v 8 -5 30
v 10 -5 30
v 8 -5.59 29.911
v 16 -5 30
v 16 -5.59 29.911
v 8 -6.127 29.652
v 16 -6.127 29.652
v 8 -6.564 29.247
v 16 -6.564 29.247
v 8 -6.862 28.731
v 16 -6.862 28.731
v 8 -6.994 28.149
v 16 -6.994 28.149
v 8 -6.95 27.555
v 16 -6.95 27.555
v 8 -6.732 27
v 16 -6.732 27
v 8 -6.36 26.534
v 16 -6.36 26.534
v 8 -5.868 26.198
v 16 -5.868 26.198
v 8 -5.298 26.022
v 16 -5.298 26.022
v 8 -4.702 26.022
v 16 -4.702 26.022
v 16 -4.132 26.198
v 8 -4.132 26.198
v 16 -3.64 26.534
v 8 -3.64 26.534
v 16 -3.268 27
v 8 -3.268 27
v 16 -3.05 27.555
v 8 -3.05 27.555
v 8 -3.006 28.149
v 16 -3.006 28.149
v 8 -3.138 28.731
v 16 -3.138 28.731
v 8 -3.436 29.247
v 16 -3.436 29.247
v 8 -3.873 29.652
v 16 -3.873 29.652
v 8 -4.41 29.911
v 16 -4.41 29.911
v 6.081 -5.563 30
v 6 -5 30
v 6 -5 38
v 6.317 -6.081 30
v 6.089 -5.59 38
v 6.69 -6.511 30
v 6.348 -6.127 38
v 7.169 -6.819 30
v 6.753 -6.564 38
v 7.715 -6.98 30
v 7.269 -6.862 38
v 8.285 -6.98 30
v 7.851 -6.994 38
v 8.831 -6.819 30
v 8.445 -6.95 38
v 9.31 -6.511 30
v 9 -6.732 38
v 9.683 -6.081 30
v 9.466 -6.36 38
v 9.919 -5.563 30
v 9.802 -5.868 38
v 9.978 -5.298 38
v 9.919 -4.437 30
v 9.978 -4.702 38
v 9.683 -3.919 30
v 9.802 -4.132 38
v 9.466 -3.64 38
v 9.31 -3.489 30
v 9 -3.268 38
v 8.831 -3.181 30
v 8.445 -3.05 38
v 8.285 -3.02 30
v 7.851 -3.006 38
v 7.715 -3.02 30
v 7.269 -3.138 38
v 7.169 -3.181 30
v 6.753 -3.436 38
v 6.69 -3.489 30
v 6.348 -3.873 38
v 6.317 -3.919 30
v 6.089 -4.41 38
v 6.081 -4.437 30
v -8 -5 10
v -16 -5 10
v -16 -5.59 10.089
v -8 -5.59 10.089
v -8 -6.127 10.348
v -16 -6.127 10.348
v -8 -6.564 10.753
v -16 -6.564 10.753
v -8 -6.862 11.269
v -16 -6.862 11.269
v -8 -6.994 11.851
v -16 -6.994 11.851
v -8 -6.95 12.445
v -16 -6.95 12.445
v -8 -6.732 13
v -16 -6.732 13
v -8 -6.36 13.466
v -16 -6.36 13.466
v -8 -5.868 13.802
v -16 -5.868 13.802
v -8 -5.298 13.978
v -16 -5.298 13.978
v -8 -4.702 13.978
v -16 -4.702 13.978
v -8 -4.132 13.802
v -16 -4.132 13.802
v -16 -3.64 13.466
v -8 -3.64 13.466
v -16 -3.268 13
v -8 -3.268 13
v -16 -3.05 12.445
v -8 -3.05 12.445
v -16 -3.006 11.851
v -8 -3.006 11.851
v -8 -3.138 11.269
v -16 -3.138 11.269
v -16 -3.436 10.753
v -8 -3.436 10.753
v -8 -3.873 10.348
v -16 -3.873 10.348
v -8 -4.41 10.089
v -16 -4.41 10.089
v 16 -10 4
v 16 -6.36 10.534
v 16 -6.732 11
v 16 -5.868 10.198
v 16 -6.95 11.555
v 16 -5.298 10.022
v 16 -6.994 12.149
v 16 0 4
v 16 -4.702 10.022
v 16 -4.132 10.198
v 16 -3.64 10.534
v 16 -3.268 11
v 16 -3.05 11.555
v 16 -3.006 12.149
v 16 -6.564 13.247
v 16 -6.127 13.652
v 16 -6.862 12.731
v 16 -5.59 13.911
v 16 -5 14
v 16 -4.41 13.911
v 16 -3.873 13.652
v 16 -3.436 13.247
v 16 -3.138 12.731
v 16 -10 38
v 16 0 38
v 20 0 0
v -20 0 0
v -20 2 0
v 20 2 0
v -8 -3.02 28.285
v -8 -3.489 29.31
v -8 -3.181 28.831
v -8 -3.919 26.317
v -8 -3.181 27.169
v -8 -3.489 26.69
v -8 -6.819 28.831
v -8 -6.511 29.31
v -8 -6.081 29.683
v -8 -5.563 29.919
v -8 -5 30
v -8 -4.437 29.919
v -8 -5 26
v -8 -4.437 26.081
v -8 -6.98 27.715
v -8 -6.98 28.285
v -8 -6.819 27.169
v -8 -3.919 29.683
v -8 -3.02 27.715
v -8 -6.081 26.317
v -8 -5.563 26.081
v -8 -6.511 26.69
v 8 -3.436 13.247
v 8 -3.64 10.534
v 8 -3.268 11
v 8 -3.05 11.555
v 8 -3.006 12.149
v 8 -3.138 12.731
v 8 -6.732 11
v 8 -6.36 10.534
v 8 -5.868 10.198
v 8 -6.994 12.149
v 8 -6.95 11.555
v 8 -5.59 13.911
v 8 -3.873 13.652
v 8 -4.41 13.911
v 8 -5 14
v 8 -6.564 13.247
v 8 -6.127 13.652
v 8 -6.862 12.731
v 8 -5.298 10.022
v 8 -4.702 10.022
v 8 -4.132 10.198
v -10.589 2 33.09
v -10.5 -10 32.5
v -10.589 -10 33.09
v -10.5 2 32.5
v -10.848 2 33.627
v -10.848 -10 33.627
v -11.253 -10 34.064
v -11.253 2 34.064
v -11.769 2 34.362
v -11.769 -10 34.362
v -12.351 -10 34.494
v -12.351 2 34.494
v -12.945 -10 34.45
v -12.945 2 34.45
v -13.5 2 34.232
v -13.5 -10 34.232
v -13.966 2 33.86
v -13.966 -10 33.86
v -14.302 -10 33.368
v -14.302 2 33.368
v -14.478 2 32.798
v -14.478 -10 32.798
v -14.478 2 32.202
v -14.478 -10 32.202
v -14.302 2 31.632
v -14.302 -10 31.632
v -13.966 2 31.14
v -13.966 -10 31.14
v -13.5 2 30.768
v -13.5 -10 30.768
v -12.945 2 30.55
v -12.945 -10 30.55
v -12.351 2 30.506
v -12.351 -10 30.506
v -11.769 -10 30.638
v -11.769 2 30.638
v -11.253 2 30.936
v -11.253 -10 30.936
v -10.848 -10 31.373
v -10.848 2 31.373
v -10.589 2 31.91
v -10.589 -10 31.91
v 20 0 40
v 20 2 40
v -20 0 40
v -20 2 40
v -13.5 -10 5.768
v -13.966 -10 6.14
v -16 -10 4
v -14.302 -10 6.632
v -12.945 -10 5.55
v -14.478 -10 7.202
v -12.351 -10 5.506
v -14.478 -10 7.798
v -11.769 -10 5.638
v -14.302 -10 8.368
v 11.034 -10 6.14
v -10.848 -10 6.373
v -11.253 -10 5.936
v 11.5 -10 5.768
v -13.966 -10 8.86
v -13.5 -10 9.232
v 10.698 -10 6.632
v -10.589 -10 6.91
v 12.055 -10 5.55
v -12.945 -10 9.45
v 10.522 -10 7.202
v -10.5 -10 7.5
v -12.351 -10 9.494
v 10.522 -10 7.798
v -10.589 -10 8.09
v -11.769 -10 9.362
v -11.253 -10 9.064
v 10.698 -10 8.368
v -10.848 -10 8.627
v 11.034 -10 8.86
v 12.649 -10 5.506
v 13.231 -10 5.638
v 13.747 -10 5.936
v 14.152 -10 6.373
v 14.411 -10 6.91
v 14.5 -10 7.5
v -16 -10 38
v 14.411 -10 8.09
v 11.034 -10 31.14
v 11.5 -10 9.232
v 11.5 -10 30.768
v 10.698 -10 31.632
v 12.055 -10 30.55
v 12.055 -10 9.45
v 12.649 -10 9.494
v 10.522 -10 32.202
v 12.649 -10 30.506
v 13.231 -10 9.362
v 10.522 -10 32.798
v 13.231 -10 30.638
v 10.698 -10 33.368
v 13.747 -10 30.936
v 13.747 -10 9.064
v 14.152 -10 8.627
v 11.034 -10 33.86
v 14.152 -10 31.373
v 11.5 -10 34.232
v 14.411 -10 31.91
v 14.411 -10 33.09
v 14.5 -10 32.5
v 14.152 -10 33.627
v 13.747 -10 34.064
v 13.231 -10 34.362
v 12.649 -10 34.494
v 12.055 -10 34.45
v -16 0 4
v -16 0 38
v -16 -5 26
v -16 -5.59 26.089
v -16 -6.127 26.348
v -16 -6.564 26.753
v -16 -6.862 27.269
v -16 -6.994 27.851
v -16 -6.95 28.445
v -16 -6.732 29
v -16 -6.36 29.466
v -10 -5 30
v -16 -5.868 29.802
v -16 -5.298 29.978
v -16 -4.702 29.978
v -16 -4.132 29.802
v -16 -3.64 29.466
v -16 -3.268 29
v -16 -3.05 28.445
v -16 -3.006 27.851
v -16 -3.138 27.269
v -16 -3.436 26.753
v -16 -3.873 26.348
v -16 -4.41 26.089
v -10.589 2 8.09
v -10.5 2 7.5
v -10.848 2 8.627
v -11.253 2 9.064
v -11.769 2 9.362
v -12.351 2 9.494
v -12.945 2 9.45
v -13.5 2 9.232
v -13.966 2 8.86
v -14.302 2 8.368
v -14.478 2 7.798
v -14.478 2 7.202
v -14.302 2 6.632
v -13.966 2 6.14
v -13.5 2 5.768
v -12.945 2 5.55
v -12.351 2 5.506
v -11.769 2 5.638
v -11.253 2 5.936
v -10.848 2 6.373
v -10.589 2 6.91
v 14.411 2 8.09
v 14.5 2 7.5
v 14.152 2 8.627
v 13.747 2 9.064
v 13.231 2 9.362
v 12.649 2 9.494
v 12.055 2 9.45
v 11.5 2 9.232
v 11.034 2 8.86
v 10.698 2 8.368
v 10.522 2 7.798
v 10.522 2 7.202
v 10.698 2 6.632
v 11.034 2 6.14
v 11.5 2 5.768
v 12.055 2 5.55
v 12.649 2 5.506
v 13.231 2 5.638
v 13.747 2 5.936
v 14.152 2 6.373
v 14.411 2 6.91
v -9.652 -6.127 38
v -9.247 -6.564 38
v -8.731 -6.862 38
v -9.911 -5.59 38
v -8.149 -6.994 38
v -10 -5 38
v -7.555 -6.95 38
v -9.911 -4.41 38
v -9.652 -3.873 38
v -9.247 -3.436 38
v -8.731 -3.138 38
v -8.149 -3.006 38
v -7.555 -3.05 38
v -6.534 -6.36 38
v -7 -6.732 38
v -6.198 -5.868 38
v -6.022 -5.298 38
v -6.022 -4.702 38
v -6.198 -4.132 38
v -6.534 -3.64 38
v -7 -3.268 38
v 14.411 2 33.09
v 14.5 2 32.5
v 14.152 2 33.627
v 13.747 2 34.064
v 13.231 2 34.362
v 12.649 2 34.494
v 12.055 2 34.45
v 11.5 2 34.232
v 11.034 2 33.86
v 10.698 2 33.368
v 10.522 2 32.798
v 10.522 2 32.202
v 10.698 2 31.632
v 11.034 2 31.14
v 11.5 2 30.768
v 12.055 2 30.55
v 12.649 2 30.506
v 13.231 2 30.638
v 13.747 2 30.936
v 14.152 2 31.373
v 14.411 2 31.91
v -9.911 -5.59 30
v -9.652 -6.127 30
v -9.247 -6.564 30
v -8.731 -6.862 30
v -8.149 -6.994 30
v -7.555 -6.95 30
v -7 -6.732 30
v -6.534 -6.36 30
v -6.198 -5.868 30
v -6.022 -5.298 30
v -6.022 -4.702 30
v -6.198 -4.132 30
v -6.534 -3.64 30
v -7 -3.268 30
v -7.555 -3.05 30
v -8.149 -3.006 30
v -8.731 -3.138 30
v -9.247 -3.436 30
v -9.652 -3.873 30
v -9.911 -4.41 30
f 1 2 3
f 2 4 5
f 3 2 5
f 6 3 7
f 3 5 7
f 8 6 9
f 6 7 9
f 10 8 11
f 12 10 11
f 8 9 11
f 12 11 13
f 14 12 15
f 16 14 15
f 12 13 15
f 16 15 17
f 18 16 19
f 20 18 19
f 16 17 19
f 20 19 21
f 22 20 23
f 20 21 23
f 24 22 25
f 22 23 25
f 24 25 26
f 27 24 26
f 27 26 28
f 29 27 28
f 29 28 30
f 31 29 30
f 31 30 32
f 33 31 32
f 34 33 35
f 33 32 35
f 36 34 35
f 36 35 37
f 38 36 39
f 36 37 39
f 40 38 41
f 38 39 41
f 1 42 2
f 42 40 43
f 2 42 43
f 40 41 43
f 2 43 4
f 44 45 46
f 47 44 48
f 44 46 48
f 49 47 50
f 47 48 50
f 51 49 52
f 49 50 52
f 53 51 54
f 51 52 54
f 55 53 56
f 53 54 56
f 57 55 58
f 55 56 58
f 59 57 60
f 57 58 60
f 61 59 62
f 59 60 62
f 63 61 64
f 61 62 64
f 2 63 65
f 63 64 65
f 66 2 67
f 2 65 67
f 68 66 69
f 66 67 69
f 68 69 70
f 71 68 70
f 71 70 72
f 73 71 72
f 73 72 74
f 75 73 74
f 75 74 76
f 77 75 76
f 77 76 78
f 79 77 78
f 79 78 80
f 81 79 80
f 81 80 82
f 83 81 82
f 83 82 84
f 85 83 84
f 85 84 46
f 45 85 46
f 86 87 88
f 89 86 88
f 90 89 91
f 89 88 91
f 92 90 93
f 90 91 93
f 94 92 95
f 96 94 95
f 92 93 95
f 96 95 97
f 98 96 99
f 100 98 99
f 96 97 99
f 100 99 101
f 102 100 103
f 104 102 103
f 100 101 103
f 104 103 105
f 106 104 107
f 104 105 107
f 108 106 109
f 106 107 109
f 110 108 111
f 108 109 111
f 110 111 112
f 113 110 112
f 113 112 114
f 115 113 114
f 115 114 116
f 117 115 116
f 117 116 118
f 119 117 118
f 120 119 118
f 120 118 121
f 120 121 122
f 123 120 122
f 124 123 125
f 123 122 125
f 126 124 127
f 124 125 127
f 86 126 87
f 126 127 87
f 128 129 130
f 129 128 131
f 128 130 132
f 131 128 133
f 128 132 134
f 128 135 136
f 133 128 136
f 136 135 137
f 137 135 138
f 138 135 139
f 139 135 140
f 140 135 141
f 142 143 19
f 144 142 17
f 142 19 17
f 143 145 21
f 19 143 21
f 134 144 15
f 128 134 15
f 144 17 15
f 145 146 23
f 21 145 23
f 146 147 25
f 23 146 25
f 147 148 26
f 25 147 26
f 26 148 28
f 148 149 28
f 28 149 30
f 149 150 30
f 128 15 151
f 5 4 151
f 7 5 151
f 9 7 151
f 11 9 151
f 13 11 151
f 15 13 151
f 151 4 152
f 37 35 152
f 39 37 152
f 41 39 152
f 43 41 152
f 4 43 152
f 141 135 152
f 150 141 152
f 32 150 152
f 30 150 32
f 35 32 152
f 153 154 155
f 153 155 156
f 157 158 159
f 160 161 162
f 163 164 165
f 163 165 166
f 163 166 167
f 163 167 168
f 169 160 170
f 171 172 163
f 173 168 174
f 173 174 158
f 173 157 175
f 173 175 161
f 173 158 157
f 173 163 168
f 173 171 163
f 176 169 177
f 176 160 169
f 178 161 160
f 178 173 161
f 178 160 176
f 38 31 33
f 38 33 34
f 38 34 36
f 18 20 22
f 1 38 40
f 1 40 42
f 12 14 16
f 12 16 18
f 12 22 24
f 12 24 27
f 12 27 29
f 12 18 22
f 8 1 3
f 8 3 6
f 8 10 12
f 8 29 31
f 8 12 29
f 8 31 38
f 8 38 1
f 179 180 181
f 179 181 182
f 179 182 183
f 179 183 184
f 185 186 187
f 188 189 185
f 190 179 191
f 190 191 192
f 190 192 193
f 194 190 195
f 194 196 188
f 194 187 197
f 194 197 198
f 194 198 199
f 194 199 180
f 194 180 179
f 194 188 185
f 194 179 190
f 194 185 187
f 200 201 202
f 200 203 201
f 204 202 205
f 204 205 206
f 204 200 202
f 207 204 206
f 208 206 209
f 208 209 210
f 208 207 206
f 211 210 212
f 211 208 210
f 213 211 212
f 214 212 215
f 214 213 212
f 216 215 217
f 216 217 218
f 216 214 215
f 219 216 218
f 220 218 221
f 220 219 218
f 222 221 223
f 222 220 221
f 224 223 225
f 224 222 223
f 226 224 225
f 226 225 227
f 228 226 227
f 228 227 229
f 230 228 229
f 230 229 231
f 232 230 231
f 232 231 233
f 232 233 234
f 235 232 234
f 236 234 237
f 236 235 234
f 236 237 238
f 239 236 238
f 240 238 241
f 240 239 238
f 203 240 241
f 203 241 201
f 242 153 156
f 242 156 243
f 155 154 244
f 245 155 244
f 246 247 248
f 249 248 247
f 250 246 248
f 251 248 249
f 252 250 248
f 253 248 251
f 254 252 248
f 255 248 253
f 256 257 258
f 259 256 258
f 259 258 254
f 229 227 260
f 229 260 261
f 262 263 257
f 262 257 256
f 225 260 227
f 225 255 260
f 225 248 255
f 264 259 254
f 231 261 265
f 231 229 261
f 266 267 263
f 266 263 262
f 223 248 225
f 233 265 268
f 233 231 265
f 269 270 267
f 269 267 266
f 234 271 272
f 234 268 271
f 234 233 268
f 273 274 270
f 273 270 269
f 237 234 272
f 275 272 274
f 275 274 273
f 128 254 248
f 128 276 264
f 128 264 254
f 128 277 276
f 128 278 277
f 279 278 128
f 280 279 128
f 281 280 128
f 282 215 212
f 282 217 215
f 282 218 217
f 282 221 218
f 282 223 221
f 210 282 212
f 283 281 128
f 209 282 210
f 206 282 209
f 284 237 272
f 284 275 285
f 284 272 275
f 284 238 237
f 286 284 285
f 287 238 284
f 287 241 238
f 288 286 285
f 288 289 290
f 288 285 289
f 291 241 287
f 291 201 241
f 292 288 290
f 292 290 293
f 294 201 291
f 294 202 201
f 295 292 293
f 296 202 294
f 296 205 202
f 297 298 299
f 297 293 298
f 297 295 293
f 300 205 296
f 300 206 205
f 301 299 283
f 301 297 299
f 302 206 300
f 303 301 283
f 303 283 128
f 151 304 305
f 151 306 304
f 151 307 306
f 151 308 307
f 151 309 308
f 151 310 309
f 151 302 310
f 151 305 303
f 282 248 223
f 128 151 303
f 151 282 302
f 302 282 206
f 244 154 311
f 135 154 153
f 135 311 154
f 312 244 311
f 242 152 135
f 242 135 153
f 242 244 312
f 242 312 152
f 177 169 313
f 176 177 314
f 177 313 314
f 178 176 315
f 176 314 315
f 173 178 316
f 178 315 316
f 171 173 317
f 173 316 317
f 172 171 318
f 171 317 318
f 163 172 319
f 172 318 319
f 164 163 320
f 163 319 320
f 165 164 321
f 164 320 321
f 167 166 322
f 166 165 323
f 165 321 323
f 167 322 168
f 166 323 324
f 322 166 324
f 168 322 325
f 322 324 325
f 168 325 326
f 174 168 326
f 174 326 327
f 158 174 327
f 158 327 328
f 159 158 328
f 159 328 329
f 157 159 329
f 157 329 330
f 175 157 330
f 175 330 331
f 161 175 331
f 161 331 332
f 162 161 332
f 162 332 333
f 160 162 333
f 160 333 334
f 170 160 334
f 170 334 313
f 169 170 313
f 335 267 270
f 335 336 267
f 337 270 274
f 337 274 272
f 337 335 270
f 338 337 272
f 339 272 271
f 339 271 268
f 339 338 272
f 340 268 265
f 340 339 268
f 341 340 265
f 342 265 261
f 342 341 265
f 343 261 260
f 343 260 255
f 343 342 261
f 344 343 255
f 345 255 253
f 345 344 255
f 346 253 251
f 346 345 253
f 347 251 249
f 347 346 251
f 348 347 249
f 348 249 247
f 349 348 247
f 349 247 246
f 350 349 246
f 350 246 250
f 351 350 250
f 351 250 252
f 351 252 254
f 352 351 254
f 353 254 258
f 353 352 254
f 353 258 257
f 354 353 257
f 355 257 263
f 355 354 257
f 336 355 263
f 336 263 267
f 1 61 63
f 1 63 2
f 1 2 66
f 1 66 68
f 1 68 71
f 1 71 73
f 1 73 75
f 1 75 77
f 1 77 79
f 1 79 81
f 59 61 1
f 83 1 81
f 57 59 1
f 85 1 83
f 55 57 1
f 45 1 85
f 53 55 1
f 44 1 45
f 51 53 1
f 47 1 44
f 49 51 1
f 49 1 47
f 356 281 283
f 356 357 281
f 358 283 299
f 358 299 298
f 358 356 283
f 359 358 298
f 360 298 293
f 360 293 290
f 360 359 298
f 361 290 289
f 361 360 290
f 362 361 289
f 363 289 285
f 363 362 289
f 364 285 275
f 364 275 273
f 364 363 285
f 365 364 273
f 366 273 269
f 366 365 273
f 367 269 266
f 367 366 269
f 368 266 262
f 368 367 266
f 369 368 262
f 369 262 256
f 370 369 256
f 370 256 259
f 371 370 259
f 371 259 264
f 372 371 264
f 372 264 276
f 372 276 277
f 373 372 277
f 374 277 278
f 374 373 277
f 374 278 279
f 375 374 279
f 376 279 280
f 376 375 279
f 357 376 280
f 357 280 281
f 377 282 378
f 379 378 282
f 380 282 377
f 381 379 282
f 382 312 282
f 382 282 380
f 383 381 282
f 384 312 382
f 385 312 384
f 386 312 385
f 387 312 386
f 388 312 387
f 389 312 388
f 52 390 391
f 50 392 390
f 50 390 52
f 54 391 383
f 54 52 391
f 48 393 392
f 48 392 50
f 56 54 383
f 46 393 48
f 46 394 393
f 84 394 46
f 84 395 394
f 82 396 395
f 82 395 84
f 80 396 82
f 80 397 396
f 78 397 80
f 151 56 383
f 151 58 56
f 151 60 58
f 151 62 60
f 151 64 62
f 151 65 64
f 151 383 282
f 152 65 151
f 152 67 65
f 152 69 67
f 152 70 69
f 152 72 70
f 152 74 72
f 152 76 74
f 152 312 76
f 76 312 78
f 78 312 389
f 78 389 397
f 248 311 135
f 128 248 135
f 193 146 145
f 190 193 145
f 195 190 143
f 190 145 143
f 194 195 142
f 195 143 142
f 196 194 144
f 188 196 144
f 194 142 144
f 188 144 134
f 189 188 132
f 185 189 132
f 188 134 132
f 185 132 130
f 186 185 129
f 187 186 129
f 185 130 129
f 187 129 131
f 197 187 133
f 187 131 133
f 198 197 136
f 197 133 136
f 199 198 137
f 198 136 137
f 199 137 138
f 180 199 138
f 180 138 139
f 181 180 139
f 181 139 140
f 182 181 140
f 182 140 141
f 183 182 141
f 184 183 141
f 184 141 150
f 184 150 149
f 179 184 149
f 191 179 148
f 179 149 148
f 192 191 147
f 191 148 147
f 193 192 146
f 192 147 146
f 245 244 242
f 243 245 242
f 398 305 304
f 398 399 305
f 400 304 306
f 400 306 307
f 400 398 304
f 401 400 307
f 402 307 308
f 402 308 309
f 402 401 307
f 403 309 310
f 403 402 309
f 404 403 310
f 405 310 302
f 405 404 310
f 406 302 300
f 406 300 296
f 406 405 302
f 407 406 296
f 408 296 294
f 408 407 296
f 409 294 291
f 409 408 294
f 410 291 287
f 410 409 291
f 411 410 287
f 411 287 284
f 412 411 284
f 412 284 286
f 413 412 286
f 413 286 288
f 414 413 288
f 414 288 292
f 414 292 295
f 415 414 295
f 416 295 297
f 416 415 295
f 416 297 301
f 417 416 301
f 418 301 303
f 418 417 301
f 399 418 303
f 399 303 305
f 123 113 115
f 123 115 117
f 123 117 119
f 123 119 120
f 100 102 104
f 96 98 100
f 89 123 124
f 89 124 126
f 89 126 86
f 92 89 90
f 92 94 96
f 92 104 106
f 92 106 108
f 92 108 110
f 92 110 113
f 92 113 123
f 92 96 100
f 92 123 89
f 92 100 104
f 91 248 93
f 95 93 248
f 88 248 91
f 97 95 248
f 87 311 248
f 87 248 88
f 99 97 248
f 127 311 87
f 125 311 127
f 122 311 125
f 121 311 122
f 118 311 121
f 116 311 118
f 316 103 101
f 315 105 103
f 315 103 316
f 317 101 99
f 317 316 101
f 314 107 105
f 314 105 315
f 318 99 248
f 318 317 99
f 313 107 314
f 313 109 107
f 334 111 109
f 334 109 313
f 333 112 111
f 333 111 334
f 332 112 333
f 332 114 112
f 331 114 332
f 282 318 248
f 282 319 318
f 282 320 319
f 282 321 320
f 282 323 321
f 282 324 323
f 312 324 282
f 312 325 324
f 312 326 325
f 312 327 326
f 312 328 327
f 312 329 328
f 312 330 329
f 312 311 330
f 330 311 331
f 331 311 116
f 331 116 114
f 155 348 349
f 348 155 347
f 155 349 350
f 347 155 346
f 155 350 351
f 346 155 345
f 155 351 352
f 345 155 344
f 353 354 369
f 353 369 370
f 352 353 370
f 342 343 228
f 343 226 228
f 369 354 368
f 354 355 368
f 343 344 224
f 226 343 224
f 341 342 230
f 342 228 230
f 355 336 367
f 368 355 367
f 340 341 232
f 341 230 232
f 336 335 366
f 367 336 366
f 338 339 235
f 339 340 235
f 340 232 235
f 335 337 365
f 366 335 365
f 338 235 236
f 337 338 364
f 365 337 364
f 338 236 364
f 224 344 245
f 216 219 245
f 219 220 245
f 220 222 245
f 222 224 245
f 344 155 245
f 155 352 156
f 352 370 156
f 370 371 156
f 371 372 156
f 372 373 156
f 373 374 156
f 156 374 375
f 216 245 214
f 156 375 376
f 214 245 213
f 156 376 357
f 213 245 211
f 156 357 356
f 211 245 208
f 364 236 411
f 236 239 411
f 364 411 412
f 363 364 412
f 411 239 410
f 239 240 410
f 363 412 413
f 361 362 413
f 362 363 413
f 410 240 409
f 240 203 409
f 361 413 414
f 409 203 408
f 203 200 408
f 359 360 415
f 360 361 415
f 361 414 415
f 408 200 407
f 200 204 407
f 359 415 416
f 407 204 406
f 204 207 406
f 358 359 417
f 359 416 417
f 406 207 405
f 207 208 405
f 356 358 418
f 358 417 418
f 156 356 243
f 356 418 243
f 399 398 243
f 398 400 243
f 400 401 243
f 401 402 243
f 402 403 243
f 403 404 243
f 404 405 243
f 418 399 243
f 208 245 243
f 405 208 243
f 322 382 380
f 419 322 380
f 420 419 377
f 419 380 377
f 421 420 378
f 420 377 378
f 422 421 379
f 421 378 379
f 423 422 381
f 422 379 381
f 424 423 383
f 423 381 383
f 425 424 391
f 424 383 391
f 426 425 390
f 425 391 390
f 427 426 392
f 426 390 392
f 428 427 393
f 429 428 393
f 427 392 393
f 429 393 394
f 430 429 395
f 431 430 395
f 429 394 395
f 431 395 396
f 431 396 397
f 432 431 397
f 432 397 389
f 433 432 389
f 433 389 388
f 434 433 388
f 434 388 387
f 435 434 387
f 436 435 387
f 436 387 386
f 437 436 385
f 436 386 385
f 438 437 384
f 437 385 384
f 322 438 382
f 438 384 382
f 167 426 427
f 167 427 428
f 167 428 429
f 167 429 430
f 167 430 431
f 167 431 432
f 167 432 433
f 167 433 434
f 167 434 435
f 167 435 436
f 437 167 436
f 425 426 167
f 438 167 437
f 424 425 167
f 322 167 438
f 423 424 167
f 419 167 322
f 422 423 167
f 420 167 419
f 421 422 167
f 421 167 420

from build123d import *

# Parameters (mm, degrees)
SKETCH032_W     = 40
SKETCH032_H     = 40
SKETCH032_R     = 2
PAD018_DEPTH    = 2
SKETCH033_W     = 32
SKETCH033_H     = 34
SKETCH033_R     = 2
PAD019_DEPTH    = 10
SKETCH034_R     = 2
POCKET013_DEPTH = 8
SKETCH035_R     = 2
POCKET014_DEPTH = 8
SKETCH039_R     = 2
POCKET015_DEPTH = 8


with BuildPart() as part:
    # Sketch032 → Pad018 (new body)
    with BuildSketch(Plane.XZ):
        with Locations((0, 20)):
            Rectangle(SKETCH032_W, SKETCH032_H)
        with Locations((-12.5, 7.5)):
            Circle(SKETCH032_R, mode=Mode.SUBTRACT)
        with Locations((-12.5, 32.5)):
            Circle(SKETCH032_R, mode=Mode.SUBTRACT)
        with Locations((12.5, 32.5)):
            Circle(SKETCH032_R, mode=Mode.SUBTRACT)
        with Locations((12.5, 7.5)):
            Circle(SKETCH032_R, mode=Mode.SUBTRACT)
    extrude(amount=-PAD018_DEPTH)

    # Sketch033 (on Face9 of Pad018) → Pad019 (join)
    with BuildSketch(Plane.XZ):
        with Locations((0, 21)):
            Rectangle(SKETCH033_W, SKETCH033_H)
        with Locations((-12.5, 32.5)):
            Circle(SKETCH033_R, mode=Mode.SUBTRACT)
        with Locations((12.5, 32.5)):
            Circle(SKETCH033_R, mode=Mode.SUBTRACT)
        with Locations((-12.5, 7.5)):
            Circle(SKETCH033_R, mode=Mode.SUBTRACT)
        with Locations((12.5, 7.5)):
            Circle(SKETCH033_R, mode=Mode.SUBTRACT)
    extrude(amount=PAD019_DEPTH)

    # Sketch034 (on Face10 of Pad019) → Pocket013 (cut)
    with BuildSketch(Plane(origin=(-16, 0, 0), x_dir=(0, 0, -1), z_dir=(-1, 0, 0))):
        with Locations((-28, 5)):
            Circle(SKETCH034_R)
        with Locations((-12, 5)):
            Circle(SKETCH034_R)
    extrude(amount=-POCKET013_DEPTH, mode=Mode.SUBTRACT)

    # Sketch035 (on Face7 of Pocket013) → Pocket014 (cut)
    with BuildSketch(Plane(origin=(0, 0, 38), x_dir=(-1, 0, 0), z_dir=(0, 0, 1))):
        with Locations((-8, 5)):
            Circle(SKETCH035_R)
        with Locations((8, 5)):
            Circle(SKETCH035_R)
    extrude(amount=-POCKET014_DEPTH, mode=Mode.SUBTRACT)

    # Sketch039 (on Face8 of Pocket014) → Pocket015 (cut)
    with BuildSketch(Plane(origin=(16, 0, 0), x_dir=(0, 0, 1), z_dir=(1, 0, 0))):
        with Locations((12, 5)):
            Circle(SKETCH039_R)
        with Locations((28, 5)):
            Circle(SKETCH039_R)
    extrude(amount=-POCKET015_DEPTH, mode=Mode.SUBTRACT)


solid = part.part
